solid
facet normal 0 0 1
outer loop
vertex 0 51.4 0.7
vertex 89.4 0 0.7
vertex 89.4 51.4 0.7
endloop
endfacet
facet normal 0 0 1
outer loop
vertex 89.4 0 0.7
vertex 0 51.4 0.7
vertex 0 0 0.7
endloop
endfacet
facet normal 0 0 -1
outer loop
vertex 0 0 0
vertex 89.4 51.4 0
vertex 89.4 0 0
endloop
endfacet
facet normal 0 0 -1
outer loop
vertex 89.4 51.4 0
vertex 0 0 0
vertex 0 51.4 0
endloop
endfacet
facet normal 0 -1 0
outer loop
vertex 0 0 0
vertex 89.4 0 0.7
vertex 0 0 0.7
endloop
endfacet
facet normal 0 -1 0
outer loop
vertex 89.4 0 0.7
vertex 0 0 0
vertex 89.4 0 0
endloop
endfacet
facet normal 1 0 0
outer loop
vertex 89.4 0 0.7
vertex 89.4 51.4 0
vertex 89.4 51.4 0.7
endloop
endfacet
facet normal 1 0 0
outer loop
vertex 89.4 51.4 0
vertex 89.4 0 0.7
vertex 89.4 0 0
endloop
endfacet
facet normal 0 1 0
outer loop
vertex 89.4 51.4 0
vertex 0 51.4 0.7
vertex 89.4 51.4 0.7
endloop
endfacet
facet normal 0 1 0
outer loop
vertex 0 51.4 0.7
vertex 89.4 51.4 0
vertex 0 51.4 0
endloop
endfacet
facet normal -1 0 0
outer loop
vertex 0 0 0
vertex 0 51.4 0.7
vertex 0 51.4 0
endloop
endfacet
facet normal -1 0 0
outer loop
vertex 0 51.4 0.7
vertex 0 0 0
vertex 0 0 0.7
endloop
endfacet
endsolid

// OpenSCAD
function BusinessCardThickness(3dPrinterTolerance=.4)= 0.3+3dPrinterTolerance;  
function BusinessCardWidth(3dPrinterTolerance=.4)= 51+3dPrinterTolerance;  
function BusinessCardLength(3dPrinterTolerance=.4)= 89+3dPrinterTolerance;  

module BusinessCard()
{
	cube([BusinessCardLength(), BusinessCardWidth(), BusinessCardThickness()]);
}

BusinessCard();
